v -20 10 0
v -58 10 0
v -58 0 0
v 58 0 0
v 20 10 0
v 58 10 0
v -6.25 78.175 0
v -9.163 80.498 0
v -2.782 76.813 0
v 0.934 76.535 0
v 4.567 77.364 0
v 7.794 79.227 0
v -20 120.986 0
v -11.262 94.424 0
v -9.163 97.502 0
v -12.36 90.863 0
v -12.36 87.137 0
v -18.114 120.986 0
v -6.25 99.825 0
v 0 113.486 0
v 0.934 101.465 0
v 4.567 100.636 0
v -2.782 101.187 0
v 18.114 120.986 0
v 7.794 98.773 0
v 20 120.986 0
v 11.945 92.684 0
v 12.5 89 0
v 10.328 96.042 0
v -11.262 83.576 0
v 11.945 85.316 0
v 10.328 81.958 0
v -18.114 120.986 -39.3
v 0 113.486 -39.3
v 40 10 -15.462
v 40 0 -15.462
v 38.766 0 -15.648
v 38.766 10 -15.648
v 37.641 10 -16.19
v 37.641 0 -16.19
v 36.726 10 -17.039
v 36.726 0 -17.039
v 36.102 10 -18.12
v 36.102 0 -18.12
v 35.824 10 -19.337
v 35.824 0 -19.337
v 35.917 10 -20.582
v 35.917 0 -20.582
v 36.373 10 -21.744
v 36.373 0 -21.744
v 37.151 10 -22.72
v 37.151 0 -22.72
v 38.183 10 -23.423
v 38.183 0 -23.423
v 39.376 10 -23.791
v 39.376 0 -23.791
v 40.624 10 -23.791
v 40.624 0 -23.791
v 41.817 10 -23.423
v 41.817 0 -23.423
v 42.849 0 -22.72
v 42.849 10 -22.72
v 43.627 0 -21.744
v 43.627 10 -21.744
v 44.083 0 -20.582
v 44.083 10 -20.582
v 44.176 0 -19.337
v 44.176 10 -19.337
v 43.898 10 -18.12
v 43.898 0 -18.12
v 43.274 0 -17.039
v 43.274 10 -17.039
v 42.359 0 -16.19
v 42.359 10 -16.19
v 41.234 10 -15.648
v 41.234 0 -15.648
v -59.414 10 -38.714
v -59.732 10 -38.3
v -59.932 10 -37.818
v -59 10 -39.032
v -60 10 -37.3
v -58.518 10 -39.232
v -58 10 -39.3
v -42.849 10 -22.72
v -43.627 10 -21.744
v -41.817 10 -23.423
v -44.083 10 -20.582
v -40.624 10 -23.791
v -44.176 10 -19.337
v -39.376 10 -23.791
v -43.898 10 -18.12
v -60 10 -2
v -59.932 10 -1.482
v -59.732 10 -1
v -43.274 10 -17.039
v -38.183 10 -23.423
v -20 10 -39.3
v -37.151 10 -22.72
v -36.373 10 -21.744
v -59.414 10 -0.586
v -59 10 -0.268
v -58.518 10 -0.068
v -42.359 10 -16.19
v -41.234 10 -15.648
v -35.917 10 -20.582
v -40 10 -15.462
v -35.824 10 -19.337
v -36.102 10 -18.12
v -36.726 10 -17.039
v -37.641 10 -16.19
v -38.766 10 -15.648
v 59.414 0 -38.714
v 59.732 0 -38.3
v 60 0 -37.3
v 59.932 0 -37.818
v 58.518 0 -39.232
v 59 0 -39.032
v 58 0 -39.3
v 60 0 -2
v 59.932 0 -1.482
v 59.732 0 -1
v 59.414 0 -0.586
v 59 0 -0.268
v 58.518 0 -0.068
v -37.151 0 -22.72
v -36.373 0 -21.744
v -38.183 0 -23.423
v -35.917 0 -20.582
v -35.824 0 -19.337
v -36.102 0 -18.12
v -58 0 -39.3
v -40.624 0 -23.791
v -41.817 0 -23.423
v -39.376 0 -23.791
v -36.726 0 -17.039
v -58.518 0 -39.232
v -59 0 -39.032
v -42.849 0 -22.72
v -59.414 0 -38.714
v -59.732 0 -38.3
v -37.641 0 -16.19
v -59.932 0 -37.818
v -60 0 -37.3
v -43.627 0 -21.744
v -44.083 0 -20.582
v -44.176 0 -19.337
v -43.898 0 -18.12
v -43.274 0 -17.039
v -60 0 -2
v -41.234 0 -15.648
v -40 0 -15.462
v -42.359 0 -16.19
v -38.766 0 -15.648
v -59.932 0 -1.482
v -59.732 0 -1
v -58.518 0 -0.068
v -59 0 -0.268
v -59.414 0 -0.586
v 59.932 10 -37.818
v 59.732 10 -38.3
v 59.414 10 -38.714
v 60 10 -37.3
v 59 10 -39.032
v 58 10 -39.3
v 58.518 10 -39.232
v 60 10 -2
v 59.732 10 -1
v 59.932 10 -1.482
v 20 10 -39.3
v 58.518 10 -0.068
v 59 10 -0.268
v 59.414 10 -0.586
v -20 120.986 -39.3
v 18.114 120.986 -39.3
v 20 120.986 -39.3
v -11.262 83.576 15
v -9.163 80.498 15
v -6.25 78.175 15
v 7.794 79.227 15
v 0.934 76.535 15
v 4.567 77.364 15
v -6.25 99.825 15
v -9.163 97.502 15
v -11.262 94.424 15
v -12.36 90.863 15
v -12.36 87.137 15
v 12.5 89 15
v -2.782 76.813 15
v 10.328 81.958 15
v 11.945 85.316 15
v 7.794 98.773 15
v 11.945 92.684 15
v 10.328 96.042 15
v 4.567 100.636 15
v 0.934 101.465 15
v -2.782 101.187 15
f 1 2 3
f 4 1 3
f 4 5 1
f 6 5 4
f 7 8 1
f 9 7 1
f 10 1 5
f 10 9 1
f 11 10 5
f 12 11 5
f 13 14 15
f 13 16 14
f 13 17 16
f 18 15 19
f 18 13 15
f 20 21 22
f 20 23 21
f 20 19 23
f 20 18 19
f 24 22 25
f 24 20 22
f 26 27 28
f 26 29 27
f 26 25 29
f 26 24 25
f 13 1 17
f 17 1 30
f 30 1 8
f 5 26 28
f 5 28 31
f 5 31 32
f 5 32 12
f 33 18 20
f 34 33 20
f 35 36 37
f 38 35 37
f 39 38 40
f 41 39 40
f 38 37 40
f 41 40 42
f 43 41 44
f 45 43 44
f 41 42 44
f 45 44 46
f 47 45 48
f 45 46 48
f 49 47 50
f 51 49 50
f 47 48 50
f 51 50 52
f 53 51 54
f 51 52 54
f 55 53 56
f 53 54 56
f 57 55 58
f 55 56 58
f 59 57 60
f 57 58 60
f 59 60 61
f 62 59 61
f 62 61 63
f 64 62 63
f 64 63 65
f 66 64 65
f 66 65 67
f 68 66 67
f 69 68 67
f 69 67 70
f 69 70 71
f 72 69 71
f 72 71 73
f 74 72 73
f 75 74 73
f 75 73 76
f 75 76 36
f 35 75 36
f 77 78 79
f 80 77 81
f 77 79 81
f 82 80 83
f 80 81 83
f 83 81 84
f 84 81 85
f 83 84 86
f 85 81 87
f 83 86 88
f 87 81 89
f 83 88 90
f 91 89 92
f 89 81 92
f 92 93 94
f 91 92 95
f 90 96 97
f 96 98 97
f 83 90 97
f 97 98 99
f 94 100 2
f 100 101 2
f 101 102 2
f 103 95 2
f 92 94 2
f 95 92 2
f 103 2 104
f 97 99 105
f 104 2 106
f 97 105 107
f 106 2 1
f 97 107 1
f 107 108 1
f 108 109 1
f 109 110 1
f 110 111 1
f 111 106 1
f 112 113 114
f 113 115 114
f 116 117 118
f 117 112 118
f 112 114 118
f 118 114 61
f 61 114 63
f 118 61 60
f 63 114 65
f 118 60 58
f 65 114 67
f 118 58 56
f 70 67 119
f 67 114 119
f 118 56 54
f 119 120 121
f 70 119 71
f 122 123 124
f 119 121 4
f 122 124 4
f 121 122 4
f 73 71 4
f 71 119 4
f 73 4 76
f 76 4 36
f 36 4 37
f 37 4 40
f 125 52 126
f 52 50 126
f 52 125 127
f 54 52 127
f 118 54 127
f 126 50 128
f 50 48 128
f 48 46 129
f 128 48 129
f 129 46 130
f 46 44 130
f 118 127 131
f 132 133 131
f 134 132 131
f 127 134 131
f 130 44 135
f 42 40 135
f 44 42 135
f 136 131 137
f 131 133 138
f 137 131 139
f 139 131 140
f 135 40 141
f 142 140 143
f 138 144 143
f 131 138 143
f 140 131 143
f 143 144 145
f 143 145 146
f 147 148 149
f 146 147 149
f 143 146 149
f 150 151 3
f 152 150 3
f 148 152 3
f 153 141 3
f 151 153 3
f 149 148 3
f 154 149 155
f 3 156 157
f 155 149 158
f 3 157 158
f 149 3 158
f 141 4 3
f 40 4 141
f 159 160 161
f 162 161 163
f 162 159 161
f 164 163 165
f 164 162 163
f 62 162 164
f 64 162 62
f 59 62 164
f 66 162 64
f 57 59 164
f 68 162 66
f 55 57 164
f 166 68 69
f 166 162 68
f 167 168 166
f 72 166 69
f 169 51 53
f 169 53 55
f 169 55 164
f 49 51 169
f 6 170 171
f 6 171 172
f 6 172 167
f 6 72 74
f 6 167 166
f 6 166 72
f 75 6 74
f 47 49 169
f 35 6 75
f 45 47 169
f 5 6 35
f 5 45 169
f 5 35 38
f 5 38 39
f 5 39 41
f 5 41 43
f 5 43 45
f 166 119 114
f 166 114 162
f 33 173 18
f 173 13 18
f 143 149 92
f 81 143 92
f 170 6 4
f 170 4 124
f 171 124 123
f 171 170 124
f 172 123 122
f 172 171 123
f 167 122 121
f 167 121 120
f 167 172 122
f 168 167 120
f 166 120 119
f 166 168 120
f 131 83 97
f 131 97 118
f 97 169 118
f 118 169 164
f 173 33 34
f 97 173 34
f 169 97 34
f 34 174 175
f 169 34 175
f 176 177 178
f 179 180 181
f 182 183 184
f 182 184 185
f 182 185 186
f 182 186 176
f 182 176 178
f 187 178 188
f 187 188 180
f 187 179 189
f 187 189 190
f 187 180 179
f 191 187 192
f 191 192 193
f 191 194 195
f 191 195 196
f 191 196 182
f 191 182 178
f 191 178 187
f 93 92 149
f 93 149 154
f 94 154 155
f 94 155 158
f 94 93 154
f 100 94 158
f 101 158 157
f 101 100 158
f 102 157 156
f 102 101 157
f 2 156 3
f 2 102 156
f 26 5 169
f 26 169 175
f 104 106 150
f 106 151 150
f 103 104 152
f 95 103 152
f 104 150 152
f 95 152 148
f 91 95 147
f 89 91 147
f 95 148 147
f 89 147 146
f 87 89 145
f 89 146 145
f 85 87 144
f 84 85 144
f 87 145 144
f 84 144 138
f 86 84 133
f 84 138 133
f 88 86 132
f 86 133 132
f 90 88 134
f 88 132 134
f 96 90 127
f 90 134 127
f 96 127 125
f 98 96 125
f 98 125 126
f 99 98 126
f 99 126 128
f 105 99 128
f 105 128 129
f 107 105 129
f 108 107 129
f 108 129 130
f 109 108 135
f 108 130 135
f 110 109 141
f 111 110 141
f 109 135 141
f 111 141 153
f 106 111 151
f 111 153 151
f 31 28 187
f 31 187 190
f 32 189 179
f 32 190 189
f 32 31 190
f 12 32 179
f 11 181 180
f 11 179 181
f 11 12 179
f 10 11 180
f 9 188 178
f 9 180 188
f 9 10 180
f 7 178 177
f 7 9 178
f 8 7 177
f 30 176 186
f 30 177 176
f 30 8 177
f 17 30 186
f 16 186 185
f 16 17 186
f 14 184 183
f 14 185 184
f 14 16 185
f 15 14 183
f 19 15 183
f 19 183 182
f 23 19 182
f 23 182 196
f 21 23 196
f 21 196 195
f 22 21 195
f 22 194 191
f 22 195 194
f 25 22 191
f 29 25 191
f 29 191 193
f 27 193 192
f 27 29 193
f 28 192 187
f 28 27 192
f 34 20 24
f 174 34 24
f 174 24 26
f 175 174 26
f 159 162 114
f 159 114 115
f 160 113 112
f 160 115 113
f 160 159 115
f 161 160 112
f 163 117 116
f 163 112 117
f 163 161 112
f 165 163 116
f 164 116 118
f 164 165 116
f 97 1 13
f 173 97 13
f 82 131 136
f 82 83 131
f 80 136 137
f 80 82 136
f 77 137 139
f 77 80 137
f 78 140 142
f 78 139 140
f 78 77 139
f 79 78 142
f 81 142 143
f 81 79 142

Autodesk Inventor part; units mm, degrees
ref_plane "YZ Plane" through (0, 0, 0) normal (1, 0, 0) x (0, 1, 0)
ref_plane "XZ Plane" through (0, 0, 0) normal (0, 1, 0) x (-1, 0, 0)
ref_plane "XY Plane" through (0, 0, 0) normal (0, 0, 1) x (1, 0, 0)
sketch "Sketch3" plane through (0, 0, 0) normal (0, 0, 1) x (1, 0, 0)
  line L0 (0, 0) -> (60, 0)
  line L1 (60, 0) -> (60, 10)
  line L2 (60, 10) -> (20, 10)
  line L3 (20, 10) -> (20, 120.986)
  line L4 (0, 0) -> (0, 29.8306) construction
  line L5 (0, 0) -> (-60, 0)
  line L6 (-60, 0) -> (-60, 10)
  line L7 (-60, 10) -> (-20, 10)
  line L8 (-20, 10) -> (-20, 120.986)
  line L9 (799.716, 113.486) -> (799.716, 376.2074) construction
  line L10 (0, 113.486) -> (18.1144, 120.986)
  line L11 (18.1144, 120.986) -> (20, 120.986)
  line L12 (-18.1144, 120.986) -> (0, 113.486)
  line L13 (-20, 120.986) -> (-18.1144, 120.986)
  dimension "d10" = 60
  dimension "d11" = 10
  dimension "d41" = 18.1144
  dimension "d44" = 110.986
  dimension "d45" = 7.5
  dimension "d46" = 40
  dimension "d47" = 110.986
extrude "Extrusion1" add sketch "Sketch3" against normal blind 39.3
sketch "Sketch4" plane through (0, 0, 0) normal (0, 0, 1) x (1, 0, 0)
  circle A0 centre (0, 89) radius 12.5
  point P0 (0, 0)
  dimension "d20" = 25
extrude "Extrusion2" add sketch "Sketch4" along normal blind 15
fillet "Fillet1" radius 2 4 edges at (60, 5, 0) (60, 5, -39.3) (-60, 5, 0) (-60, 5, -39.3)
sketch "Sketch5" plane through (-20, 10, 0) normal (0, 1, 0) x (1, 0, 0)
  line L0 (-38, 39.3) -> (0, 39.3) projected
  line L1 (40, 39.3) -> (78, 39.3) projected
  line L2 (-40, 2) -> (-40, 37.3) projected
  line L3 (80, 2) -> (80, 37.3) projected
  point P0 (20, 0)
  point P1 (-20, 19.65)
  point P2 (60, 19.65)
  dimension "d24" = 19.65
  dimension "d25" = 19.65
  dimension "d26" = 20
  dimension "d27" = 20
hole "Hole1" at (-40, 10, -19.65) at (40, 10, -19.65) direction (0, -1, 0) diameter 8.376 end through all thread size "M10x1.5" class "6H" standard "ISO Metric profile"
equation "\"d47\" = d44"
equation "\"d25\" = d24"
equation "\"d27\" = d26"
properties part number "Stop sliding"
